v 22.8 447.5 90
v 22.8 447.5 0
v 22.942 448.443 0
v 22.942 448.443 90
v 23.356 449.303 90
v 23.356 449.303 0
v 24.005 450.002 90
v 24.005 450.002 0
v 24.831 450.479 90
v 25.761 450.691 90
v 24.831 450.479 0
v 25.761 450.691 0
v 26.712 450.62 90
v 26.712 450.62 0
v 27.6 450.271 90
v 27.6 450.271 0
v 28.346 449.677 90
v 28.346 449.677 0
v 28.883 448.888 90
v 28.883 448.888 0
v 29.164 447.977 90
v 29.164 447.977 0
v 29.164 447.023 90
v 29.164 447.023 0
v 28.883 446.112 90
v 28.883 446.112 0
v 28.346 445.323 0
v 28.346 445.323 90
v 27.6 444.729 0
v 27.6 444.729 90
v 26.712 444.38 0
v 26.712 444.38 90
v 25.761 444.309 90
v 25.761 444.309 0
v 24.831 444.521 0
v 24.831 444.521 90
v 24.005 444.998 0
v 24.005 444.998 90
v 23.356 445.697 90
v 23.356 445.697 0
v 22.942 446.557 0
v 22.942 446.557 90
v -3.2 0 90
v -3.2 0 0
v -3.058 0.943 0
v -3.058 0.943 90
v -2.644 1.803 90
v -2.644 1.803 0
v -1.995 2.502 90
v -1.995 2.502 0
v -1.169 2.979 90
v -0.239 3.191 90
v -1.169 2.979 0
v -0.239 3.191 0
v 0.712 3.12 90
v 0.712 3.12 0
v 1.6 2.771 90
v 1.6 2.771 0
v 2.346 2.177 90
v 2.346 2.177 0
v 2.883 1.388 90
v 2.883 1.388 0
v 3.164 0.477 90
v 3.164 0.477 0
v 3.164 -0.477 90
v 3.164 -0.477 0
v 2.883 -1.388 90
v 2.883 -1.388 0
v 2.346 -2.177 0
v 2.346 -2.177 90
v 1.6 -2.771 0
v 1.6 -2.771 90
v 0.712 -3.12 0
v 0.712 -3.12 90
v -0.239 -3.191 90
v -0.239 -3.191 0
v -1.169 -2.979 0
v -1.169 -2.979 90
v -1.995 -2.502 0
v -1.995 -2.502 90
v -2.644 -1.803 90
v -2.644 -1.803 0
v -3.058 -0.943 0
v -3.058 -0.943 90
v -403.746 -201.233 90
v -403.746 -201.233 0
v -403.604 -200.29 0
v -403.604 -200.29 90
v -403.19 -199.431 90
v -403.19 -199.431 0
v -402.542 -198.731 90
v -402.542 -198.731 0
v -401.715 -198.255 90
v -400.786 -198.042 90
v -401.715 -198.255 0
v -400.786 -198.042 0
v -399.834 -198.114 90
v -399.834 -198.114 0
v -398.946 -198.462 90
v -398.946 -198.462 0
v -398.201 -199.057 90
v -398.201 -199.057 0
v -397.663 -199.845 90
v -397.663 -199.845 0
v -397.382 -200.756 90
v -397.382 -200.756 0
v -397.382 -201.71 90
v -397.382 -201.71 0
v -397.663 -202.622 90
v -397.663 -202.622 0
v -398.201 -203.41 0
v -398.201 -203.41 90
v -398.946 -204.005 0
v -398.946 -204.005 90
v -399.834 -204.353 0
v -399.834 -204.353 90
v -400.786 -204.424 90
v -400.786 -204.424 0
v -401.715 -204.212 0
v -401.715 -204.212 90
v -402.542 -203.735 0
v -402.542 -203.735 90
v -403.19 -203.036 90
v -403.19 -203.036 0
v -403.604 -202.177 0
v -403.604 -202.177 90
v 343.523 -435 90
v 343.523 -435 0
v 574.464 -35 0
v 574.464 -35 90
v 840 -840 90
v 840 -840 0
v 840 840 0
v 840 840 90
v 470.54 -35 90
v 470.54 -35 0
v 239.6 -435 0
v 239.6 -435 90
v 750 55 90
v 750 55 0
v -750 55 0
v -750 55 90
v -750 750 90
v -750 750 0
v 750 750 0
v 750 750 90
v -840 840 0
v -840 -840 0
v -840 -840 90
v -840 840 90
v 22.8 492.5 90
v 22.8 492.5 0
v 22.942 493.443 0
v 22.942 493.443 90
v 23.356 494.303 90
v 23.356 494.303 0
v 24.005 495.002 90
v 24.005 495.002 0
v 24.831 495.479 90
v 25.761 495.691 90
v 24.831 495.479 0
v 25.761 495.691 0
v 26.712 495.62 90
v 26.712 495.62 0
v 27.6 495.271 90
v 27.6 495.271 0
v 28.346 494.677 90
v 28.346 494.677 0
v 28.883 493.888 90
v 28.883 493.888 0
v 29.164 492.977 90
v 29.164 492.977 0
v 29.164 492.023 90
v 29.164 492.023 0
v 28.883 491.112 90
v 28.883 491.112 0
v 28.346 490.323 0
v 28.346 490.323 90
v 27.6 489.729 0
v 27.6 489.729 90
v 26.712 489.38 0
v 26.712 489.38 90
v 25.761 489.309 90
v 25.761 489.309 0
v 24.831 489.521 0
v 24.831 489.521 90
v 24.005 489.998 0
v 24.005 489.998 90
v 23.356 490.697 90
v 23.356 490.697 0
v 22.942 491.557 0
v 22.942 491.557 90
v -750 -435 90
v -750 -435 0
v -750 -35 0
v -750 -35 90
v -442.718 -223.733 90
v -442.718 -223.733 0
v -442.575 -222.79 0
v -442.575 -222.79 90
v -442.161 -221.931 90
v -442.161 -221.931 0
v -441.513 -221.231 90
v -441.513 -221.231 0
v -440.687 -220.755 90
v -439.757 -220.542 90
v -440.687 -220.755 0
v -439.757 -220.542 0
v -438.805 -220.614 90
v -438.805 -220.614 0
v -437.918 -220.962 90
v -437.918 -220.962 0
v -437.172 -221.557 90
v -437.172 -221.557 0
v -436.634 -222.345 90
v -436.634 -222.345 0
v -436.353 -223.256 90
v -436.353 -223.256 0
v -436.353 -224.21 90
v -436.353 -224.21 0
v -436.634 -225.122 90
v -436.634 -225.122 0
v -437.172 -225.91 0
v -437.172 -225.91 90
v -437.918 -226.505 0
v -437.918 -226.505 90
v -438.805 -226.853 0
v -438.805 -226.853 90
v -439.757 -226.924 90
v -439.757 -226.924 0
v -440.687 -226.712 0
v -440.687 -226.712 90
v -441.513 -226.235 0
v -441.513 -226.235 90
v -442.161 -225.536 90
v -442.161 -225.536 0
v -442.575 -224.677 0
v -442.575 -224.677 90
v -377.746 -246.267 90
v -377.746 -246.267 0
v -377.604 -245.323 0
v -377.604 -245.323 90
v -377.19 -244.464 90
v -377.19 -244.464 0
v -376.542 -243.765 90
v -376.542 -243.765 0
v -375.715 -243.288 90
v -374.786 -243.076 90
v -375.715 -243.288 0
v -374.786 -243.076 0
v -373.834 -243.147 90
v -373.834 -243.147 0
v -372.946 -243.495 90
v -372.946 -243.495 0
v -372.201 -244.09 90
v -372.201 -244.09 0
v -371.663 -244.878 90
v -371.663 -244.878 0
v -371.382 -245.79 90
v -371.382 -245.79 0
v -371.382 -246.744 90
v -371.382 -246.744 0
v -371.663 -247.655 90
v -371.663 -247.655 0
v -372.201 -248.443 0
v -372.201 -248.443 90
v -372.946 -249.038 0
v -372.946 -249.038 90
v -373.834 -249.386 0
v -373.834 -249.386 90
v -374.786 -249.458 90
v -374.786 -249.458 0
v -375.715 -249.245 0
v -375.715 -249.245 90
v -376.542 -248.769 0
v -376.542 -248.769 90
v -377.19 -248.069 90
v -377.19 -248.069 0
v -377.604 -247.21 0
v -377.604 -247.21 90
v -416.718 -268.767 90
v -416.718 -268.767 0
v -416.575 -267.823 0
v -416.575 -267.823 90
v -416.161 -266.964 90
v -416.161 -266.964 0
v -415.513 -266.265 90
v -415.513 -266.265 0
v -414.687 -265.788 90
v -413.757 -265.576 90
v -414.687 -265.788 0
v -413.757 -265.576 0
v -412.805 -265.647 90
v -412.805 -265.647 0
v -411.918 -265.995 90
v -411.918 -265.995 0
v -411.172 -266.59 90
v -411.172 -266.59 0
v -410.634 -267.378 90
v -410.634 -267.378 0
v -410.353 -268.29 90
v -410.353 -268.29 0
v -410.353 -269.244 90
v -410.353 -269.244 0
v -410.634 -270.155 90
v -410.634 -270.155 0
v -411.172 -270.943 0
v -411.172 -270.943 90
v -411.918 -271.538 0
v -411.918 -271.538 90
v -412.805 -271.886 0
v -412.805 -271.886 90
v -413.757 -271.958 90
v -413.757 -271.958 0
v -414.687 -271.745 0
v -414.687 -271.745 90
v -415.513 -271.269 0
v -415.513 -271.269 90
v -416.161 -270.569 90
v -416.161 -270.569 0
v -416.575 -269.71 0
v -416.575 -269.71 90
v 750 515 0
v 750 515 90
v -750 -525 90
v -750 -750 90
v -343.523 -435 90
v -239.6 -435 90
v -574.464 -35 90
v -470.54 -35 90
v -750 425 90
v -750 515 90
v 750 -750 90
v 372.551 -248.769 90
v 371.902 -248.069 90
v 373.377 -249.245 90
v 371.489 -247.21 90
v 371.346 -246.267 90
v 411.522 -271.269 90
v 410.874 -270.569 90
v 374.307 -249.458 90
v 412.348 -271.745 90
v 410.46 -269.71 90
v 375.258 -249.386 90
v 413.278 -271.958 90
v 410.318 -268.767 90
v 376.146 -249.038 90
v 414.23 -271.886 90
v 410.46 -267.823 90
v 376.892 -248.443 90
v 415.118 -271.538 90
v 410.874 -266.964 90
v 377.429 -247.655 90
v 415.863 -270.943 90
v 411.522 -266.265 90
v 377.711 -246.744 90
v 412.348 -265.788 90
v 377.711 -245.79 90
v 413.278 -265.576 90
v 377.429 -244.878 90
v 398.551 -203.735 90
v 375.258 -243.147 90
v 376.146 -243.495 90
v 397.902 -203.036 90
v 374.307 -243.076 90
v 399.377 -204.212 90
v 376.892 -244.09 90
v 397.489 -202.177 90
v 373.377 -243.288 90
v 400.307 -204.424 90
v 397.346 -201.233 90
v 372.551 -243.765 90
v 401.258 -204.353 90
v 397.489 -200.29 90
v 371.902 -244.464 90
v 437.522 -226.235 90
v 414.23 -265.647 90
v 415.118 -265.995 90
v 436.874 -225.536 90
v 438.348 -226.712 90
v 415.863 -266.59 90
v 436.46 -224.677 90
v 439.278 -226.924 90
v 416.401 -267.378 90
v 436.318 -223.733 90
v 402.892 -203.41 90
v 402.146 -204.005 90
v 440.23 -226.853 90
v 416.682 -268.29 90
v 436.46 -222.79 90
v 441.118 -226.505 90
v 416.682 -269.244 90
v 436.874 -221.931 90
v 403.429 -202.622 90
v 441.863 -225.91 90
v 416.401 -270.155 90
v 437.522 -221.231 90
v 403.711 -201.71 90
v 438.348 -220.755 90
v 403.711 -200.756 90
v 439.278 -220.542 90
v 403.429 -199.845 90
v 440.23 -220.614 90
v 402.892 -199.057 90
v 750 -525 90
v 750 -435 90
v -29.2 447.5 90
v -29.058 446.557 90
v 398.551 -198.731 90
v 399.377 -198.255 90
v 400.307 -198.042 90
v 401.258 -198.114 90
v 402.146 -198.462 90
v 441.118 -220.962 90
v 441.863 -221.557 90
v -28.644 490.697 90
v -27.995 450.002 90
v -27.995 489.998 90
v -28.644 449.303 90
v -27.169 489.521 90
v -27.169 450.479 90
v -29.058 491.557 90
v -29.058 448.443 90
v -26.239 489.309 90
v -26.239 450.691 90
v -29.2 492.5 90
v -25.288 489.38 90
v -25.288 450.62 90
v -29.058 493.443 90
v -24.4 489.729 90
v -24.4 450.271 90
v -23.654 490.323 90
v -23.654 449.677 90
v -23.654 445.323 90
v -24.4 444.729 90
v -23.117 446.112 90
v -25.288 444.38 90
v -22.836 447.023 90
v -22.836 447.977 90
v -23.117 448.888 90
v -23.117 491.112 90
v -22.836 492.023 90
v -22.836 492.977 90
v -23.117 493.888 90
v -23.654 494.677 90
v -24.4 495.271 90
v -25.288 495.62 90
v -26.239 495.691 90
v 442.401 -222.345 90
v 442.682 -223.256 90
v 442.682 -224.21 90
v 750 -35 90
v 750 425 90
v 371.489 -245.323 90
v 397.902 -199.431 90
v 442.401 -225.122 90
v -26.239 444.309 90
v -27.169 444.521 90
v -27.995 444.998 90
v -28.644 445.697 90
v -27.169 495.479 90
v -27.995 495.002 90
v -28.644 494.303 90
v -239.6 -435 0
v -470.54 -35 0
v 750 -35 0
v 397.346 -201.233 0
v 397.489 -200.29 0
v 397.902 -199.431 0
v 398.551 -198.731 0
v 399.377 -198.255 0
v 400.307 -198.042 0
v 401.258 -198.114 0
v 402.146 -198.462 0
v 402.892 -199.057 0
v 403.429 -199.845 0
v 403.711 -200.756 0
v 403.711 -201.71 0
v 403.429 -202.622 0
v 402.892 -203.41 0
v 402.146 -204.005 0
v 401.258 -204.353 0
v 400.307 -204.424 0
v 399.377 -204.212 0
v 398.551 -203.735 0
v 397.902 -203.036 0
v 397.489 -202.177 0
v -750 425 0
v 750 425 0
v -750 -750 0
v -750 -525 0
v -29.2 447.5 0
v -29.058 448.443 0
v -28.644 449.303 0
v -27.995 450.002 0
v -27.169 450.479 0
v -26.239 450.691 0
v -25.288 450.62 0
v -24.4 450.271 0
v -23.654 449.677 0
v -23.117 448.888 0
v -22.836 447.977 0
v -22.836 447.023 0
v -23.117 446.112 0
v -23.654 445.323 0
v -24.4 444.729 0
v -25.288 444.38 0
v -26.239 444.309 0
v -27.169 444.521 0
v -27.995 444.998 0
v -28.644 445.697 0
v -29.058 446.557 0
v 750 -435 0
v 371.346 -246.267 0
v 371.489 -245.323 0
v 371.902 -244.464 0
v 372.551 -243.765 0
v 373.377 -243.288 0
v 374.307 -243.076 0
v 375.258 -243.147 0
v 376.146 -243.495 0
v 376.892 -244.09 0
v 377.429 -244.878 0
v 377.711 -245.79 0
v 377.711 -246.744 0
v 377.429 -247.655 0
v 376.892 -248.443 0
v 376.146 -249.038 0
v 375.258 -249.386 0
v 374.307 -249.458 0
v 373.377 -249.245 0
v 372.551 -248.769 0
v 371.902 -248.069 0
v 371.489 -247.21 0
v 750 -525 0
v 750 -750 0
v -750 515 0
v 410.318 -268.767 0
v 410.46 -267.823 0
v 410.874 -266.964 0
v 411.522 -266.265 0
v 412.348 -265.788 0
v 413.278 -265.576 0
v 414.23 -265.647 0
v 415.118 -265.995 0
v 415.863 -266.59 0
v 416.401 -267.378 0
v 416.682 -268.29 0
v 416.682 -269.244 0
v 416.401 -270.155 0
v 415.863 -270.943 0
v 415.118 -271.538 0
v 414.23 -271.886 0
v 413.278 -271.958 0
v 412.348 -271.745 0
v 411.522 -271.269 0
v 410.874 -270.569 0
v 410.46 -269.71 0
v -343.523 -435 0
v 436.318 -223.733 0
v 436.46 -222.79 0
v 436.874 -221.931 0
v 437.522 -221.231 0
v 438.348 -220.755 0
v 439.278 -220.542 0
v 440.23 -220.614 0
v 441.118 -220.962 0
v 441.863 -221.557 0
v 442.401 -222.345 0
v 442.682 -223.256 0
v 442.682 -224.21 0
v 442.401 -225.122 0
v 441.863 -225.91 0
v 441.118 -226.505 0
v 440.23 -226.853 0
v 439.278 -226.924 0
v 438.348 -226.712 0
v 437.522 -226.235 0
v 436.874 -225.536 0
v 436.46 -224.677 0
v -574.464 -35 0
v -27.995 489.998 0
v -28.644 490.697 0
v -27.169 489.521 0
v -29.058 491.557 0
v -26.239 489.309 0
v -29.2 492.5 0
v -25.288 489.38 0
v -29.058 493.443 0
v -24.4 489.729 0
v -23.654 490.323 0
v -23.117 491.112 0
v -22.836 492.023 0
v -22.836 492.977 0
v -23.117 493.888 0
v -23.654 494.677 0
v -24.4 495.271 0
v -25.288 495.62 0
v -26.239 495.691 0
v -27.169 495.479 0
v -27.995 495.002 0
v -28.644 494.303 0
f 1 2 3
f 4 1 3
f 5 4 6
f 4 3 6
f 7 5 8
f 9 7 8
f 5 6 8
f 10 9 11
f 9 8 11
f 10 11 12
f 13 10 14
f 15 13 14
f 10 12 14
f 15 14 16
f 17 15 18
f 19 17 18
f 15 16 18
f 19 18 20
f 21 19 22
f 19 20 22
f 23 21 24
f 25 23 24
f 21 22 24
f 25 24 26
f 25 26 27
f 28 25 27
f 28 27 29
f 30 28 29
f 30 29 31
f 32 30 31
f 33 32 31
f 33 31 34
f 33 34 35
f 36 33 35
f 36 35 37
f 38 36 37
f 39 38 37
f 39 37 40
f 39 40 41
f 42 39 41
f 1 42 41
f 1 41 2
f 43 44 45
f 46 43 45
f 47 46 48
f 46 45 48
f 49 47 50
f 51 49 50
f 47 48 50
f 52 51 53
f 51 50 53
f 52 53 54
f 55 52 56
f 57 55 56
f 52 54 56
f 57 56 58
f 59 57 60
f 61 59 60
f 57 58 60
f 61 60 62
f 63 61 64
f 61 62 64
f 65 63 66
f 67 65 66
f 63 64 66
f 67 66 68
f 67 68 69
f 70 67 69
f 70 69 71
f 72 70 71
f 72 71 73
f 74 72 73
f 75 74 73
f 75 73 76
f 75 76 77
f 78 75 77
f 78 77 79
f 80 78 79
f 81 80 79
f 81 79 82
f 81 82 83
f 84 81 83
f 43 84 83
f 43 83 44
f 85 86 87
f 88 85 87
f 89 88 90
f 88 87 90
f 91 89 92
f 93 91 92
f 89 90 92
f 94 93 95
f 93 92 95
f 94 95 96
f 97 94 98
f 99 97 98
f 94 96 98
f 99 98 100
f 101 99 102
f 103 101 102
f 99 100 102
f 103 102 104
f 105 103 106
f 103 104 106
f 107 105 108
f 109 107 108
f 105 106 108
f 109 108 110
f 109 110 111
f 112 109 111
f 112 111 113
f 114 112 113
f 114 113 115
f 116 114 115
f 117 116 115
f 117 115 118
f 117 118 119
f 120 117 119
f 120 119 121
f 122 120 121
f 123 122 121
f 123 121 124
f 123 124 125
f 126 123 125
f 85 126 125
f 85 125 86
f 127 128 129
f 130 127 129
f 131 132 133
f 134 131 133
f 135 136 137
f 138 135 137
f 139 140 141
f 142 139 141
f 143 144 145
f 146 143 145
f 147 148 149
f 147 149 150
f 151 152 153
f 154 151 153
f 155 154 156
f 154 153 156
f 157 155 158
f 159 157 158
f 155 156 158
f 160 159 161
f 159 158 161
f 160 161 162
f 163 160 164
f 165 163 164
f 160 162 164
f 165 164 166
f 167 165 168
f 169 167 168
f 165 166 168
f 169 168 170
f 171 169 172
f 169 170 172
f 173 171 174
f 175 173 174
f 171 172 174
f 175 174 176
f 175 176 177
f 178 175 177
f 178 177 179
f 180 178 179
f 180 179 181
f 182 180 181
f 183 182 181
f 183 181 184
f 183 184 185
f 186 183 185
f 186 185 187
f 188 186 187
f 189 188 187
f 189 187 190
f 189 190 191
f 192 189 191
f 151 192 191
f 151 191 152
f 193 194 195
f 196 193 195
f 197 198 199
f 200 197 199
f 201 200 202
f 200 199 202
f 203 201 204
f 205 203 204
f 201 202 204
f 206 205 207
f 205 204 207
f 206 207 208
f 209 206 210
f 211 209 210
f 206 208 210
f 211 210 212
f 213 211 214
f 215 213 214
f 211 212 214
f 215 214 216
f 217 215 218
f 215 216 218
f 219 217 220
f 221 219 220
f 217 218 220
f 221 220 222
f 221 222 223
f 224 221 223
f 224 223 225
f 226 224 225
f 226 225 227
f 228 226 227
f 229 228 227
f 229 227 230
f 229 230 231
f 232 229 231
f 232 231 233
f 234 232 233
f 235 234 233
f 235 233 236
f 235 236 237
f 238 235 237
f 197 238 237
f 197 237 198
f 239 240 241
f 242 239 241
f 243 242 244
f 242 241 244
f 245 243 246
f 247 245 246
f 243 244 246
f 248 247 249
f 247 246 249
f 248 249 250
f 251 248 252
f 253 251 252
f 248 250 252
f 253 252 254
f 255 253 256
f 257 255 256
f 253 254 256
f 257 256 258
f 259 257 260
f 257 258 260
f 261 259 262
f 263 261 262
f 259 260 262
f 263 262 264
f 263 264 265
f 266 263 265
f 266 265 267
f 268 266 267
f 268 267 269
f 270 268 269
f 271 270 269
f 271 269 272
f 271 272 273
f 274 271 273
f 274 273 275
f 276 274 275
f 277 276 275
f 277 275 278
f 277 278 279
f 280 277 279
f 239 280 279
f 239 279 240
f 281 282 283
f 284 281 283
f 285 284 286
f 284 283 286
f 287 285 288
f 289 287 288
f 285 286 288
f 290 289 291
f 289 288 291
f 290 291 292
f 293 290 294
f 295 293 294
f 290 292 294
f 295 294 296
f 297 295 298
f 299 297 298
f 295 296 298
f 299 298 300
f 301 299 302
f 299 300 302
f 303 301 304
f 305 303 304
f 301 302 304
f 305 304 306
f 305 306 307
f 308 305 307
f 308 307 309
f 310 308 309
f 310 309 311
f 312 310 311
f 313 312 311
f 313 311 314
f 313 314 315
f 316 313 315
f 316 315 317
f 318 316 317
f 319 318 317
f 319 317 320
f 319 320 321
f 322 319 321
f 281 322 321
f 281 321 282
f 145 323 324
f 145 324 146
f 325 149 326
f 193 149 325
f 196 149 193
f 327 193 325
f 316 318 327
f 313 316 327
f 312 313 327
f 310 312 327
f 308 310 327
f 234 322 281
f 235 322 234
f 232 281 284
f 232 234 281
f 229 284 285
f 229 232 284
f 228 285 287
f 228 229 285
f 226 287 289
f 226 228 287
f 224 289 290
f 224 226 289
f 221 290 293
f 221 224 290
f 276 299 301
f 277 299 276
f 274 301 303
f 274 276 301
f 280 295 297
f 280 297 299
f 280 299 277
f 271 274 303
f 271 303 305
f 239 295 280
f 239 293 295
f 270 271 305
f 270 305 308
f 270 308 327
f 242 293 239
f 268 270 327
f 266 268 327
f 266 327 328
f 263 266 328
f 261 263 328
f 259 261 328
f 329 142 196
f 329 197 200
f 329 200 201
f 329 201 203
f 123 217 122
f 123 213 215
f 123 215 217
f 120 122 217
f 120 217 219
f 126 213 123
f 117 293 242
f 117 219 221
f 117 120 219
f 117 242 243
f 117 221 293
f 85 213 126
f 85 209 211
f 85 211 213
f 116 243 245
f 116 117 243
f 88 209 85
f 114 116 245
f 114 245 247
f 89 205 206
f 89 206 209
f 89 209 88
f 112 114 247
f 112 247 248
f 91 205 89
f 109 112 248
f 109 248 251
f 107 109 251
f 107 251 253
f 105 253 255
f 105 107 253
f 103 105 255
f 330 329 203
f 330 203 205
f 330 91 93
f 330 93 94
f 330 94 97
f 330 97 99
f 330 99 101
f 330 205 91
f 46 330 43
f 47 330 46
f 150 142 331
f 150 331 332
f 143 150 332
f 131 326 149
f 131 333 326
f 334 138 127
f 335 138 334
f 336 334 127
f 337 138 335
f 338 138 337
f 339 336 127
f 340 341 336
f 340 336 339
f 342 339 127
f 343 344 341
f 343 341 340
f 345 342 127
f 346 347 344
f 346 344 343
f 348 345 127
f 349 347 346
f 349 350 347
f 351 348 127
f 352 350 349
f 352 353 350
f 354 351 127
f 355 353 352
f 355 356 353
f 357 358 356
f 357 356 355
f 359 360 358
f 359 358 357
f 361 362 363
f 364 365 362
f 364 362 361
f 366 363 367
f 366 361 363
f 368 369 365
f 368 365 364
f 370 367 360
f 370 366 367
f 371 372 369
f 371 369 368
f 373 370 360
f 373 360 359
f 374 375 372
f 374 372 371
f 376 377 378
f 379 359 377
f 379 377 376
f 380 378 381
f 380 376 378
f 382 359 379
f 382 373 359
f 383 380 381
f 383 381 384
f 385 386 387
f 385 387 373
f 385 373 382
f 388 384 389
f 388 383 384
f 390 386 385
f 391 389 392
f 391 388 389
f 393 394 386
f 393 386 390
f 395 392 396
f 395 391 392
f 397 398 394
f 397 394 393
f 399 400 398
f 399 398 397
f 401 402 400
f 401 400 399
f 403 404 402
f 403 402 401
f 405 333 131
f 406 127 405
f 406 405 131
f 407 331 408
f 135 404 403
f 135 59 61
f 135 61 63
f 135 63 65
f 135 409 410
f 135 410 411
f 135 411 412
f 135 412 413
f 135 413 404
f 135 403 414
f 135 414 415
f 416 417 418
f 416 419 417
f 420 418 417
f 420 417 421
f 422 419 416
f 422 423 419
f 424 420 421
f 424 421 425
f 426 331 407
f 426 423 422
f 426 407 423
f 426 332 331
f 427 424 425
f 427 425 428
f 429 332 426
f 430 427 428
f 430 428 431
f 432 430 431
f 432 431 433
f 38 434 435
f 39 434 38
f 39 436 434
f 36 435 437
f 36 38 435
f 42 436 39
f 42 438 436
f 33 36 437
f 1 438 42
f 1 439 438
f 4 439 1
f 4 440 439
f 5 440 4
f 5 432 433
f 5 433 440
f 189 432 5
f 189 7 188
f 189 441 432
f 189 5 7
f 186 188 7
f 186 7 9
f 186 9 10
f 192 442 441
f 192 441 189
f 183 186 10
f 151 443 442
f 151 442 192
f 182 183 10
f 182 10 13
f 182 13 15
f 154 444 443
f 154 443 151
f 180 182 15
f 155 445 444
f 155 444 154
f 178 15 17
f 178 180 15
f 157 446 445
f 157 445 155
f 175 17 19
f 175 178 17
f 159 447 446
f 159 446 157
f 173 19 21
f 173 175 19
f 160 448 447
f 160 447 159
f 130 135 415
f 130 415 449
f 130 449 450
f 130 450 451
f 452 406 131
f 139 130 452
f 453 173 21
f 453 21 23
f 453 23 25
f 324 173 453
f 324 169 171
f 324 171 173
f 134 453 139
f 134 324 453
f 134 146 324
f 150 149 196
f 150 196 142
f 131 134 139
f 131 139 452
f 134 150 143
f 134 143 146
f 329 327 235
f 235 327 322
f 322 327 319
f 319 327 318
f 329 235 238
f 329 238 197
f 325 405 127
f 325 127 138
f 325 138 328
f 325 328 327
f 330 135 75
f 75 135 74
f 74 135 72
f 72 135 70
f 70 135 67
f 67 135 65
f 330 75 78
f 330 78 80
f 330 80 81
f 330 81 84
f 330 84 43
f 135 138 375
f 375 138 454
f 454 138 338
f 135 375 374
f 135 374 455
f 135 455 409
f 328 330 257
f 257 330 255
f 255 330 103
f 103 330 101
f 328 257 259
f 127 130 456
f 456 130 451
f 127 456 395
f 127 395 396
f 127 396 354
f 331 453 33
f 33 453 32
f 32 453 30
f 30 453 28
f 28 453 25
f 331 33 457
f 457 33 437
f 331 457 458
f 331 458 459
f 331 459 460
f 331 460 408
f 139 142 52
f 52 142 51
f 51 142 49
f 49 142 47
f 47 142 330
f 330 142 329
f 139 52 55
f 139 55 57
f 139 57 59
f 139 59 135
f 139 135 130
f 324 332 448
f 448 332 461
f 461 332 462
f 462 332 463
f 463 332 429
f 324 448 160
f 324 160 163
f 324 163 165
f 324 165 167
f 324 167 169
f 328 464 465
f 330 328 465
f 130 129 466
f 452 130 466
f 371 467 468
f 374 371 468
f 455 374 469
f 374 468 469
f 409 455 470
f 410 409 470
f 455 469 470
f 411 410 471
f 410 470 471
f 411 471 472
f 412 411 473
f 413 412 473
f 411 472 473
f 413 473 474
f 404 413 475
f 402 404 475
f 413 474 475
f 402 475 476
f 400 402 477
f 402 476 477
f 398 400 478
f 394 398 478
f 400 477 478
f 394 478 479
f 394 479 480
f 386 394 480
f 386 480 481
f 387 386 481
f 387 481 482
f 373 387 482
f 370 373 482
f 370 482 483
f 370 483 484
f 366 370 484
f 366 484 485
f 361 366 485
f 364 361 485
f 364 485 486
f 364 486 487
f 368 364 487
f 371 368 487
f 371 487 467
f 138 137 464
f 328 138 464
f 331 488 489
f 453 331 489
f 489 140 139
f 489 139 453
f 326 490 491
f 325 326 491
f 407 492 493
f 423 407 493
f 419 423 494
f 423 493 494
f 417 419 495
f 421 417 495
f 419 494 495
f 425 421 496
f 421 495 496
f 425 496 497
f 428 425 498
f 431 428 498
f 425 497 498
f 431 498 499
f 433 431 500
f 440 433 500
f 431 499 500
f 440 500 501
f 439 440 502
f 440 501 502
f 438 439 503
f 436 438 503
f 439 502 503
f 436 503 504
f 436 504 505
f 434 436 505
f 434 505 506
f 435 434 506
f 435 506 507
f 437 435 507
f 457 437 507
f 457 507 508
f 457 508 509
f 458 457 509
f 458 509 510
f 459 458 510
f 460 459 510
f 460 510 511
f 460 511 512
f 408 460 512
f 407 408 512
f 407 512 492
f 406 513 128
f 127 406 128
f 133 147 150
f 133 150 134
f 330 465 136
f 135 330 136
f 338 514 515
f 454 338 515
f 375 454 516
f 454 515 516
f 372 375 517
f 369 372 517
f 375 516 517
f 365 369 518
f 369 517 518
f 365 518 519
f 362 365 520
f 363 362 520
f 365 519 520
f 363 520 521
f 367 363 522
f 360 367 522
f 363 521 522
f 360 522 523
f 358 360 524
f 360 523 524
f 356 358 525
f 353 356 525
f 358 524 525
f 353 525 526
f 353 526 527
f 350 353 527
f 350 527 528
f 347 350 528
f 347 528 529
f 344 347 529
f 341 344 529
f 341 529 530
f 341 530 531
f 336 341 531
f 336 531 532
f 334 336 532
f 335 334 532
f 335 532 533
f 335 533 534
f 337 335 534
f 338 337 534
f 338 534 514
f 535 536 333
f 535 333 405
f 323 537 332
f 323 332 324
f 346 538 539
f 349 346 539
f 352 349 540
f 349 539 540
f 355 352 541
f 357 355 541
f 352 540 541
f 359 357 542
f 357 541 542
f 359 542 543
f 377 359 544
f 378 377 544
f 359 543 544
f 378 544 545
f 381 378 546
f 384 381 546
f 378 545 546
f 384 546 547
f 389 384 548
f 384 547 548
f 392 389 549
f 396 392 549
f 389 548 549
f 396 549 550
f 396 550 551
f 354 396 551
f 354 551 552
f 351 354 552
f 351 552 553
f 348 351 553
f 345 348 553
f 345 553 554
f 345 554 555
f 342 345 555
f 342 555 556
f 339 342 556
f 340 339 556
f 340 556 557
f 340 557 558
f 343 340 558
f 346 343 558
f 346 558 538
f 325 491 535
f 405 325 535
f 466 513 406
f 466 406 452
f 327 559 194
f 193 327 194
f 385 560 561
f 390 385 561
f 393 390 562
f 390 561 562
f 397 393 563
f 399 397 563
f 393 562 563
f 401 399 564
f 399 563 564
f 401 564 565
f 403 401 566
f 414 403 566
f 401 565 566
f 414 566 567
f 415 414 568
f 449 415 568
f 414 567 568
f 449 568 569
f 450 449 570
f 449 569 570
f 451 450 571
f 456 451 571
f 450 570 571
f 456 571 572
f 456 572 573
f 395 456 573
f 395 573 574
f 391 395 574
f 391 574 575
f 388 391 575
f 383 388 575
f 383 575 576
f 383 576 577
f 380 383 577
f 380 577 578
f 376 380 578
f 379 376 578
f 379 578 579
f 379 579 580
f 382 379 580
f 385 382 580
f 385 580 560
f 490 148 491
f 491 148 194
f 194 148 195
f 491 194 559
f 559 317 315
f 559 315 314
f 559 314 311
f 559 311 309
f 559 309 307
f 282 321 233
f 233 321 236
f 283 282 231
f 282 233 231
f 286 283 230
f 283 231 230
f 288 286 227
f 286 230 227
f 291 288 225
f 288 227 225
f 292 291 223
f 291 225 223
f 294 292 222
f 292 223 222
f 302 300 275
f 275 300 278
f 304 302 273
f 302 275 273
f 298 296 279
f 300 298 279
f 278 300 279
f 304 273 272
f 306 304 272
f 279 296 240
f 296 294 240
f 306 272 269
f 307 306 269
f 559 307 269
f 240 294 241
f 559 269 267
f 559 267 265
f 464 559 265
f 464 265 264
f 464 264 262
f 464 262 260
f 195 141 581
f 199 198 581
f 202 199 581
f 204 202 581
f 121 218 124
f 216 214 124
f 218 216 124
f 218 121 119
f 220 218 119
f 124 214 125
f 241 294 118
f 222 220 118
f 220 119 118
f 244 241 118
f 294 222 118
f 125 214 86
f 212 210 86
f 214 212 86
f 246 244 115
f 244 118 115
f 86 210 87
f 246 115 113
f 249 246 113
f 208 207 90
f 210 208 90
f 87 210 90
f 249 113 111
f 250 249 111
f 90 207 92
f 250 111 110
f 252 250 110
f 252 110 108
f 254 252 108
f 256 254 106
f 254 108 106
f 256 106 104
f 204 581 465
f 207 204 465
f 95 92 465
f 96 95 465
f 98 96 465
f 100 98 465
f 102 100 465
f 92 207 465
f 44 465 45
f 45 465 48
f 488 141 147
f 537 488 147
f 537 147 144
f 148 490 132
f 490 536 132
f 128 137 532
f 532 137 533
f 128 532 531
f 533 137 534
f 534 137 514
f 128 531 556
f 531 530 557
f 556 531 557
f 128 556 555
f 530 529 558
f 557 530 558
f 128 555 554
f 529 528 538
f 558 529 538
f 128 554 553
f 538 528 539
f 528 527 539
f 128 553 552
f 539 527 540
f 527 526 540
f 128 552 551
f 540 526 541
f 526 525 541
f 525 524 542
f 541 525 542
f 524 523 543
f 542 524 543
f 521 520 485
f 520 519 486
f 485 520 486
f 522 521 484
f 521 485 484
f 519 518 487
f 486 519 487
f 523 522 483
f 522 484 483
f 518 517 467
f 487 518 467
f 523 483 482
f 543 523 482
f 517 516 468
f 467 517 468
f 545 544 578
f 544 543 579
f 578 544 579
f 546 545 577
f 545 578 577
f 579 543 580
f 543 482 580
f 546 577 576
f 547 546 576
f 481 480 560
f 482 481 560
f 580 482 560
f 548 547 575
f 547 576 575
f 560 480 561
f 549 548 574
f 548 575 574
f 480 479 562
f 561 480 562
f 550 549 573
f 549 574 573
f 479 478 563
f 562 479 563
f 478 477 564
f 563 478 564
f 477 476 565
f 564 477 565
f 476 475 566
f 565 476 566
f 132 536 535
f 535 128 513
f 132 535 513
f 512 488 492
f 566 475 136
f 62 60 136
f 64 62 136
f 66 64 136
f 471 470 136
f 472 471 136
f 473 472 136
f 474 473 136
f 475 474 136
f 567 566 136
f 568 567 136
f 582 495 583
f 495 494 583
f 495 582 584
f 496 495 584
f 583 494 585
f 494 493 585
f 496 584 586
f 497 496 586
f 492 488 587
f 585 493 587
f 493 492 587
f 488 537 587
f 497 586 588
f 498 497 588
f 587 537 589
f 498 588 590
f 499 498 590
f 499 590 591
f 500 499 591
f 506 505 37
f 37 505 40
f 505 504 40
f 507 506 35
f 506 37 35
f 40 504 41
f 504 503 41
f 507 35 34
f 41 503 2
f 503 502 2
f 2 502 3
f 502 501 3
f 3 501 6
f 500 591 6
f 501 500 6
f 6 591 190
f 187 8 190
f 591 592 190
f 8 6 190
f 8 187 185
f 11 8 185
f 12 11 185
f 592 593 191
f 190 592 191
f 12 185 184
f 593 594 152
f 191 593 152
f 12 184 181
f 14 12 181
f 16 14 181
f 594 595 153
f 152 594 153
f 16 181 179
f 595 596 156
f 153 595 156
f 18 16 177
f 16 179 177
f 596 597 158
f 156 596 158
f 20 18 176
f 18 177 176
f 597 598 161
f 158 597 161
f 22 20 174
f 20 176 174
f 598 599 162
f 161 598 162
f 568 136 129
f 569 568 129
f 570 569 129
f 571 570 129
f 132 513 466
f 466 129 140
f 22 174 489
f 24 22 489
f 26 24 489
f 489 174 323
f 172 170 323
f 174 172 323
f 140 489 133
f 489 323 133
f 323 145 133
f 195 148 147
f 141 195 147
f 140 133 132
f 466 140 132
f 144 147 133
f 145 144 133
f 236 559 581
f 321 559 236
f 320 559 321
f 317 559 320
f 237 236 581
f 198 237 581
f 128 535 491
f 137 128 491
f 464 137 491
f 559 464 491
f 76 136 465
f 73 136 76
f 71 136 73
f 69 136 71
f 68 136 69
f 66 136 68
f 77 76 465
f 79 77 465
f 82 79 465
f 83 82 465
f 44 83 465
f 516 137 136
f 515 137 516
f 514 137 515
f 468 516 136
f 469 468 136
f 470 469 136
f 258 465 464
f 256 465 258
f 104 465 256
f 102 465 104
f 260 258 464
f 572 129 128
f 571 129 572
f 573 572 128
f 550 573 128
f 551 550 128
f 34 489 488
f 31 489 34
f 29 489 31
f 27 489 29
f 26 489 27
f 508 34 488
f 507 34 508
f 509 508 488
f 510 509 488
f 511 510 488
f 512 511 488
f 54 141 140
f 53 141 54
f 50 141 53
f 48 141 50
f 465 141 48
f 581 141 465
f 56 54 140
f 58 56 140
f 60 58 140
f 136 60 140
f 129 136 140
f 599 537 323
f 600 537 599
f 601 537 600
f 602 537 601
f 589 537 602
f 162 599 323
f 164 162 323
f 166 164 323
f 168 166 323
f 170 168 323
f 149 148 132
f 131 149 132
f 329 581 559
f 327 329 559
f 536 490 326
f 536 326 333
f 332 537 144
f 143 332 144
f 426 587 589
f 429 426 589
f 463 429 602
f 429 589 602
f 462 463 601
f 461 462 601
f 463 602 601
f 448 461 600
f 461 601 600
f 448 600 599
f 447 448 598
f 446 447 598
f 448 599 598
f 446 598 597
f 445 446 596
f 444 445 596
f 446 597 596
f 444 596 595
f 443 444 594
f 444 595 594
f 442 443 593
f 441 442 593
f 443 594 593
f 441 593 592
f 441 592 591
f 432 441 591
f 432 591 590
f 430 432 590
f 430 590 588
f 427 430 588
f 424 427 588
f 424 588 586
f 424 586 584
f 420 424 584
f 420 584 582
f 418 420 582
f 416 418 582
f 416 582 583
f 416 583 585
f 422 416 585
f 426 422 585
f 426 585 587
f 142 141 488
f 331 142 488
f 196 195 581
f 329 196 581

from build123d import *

# Parameters (mm, degrees)
CROQUIS1_W                   = 1680
CROQUIS1_H                   = 1680
CROQUIS1_W_2                 = 1500
CROQUIS1_H_2                 = 1500
CROQUIS1_H_3                 = 90
SALIENTE_EXTRUIR1_DEPTH      = 90
TALADRO_DE_MARGEN_PARA_M61_D = 6.4


with BuildPart() as part:
    # Croquis1 → Saliente-Extruir1 (new body)
    with BuildSketch(Plane.XY):
        Rectangle(CROQUIS1_W, CROQUIS1_H)
        Rectangle(CROQUIS1_W_2, CROQUIS1_H_2, mode=Mode.SUBTRACT)
        with Locations((0, 470)):
            Rectangle(CROQUIS1_W_2, CROQUIS1_H_3)
        Polygon((-750, 55), (-750, -35), (-574.463517844, -35), (-470.54046939, -35), (470.54046939, -35), (574.463517844, -35), (750, -35), (750, 55), align=None)
        Polygon((-750, -435), (-750, -525), (750, -525), (750, -435), (343.523410168, -435), (239.600361714, -435), (-239.600361714, -435), (-343.523410168, -435), align=None)
        Polygon((-574.463517844, -35), (-343.523410168, -435), (-239.600361714, -435), (-470.54046939, -35), align=None)
        Polygon((239.600361714, -435), (343.523410168, -435), (574.463517844, -35), (470.54046939, -35), align=None)
    extrude(amount=SALIENTE_EXTRUIR1_DEPTH)

    # Taladro de margen para M61 (through all)
    with Locations(Plane.XY.offset(90)):
        with Locations((-26, 492.5), (26, 492.5), (26, 447.5), (-26, 447.5), (439.517511364, -223.733339502), (413.517511364, -268.766660498), (374.546368194, -246.266660498), (400.546368194, -201.233339502), (-413.517511364, -268.766660498), (-439.517511364, -223.733339502), (-400.546368194, -201.233339502), (-374.546368194, -246.266660498), (0, 0)):
            Hole(TALADRO_DE_MARGEN_PARA_M61_D / 2)


solid = part.part
